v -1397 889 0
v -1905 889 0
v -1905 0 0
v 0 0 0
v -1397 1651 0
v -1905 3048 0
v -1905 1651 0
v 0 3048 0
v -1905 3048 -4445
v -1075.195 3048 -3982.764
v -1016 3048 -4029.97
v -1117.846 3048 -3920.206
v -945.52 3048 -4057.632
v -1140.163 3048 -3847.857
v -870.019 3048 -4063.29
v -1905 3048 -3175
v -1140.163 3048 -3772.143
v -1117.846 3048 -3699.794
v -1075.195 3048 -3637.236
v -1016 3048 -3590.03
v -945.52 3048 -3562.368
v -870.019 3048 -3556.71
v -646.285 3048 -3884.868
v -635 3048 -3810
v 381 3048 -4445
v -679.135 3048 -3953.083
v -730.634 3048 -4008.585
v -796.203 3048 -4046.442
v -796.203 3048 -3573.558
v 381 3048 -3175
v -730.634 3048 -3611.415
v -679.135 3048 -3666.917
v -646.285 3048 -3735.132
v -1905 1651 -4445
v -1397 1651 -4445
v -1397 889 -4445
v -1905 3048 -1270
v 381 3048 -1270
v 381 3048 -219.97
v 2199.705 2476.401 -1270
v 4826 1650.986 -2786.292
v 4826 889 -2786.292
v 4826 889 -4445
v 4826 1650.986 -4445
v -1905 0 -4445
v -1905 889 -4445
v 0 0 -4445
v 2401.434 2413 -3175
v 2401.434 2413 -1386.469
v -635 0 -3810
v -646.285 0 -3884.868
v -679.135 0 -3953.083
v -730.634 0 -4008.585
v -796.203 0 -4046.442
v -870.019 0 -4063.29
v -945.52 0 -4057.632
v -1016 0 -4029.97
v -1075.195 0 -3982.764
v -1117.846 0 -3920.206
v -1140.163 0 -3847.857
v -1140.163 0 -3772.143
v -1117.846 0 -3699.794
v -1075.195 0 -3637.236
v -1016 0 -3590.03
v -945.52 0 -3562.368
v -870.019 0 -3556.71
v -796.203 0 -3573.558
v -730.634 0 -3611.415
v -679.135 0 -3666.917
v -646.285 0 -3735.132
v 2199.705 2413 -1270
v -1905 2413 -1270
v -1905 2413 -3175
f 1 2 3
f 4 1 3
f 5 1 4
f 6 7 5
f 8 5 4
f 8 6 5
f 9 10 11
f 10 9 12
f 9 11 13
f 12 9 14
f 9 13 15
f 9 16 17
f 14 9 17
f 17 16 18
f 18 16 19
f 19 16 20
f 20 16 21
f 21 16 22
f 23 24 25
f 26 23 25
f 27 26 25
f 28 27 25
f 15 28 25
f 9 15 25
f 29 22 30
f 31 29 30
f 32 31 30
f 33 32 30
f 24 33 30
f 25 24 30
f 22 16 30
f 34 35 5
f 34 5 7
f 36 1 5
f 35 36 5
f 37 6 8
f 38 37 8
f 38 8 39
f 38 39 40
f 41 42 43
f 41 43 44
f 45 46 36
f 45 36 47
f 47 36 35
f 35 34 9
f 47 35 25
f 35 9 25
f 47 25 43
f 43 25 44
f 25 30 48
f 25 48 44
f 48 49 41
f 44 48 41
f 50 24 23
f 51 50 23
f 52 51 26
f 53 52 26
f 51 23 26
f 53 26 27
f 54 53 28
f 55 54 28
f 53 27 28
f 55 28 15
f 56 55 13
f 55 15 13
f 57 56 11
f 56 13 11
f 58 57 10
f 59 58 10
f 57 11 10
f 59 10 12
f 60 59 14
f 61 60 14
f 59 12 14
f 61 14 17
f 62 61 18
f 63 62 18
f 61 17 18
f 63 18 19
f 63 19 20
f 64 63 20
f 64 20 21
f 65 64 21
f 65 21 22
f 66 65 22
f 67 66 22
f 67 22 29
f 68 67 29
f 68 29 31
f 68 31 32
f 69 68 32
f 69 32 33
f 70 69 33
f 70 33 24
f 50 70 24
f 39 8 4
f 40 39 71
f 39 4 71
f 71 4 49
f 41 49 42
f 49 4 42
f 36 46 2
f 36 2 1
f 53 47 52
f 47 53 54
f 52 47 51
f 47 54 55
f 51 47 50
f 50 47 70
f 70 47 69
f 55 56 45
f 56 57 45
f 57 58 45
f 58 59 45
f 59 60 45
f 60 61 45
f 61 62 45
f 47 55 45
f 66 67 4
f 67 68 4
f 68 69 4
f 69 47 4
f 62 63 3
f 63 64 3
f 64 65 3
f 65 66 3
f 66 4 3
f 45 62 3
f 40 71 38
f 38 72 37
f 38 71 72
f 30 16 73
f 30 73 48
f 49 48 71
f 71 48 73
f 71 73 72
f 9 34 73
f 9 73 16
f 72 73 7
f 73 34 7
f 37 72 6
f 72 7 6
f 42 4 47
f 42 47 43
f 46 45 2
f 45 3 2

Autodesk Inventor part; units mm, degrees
ref_plane "YZ Plane" through (0, 0, 0) normal (1, 0, 0) x (0, 1, 0)
ref_plane "XZ Plane" through (0, 0, 0) normal (0, 1, 0) x (-1, 0, 0)
ref_plane "XY Plane" through (0, 0, 0) normal (0, 0, 1) x (1, 0, 0)
sketch "Sketch1" plane through (0, 0, 0) normal (0, 0, 1) x (1, 0, 0)
  line L0 (0, 0) -> (-1905, 0)
  line L1 (-1905, 0) -> (-1905, 889)
  line L2 (-1905, 889) -> (-1397, 889)
  line L3 (-1397, 889) -> (-1397, 1651)
  line L4 (-1397, 1651) -> (-1905, 1651)
  line L5 (-1905, 1651) -> (-1905, 3048)
  line L6 (-1905, 3048) -> (381, 3048)
  line L7 (4826, 2413) -> (381, 3048)
  line L8 (0, 0) -> (4445, 0)
  line L9 (4445, 0) -> (4826, 0)
  line L10 (4826, 0) -> (4826, 2413)
  dimension "d0" = 1905
  dimension "d1" = 889
  dimension "d2" = 508
  dimension "d3" = 762
  dimension "d4" = 508
  dimension "d5" = 1397
  dimension "d6" = 2286
  dimension "d10" = 4445
  dimension "d11" = 381
extrude "Extrusion1" add sketch "Sketch1" against normal blind 4445
sketch "Sketch3" plane through (-1905, 0, 0) normal (0, -1, 0) x (1, 0, 0)
  line L0 (1905, 0) -> (6731, -2786.2924)
  line L1 (6731, 0) -> (6731, -4445) projected
  line L2 (6731, -2786.2924) -> (6731, 0)
  line L3 (0, 0) -> (6731, 0) projected
  line L4 (1905, 0) -> (6731, 0)
extrude "Extrusion2" cut sketch "Sketch3" against normal through all
sketch "Sketch4" plane through (-1905, 0, -4445) normal (0, -1, 0) x (1, 0, 0)
  point P0 (1905, 4445)
  point P1 (6731, 0)
sketch "Sketch5" plane through (0, 0, 0) normal (0, 0, 1) x (1, 0, 0)
  line L0 (381, 3048) -> (4826, 1650.986)
  line L1 (4826, 1650.986) -> (4826, 3048)
  line L2 (-1905, 3048) -> (381, 3048) projected
  line L3 (4826, 3048) -> (381, 3048)
  point P0 (0, 0)
extrude "Extrusion3" cut sketch "Sketch5" against normal through all
sketch "Sketch6" plane through (0, 0, 0) normal (0, 0, 1) x (1, 0, 0)
  line L0 (-1397, 889) -> (-1397, 1651) projected
  line L1 (4826, 1650.986) -> (4826, 0) projected
  line L2 (4826, 0) -> (0, 0) projected
  line L3 (0, 0) -> (4826, 889)
  line L4 (0, 0) -> (4826, 0)
  line L5 (4826, 889) -> (4826, 0)
extrude "Extrusion4" cut sketch "Sketch6" against normal through all
sketch "Sketch7" plane through (-1905, 1651, 0) normal (-1, 0, 0) x (0, 0, 1)
  line L0 (-4445, 1397) -> (-4445, -0.014) projected
  line L1 (-3175, 1397) -> (-3175, 762)
  line L2 (-3175, 762) -> (-1270, 762)
  line L3 (-1270, 762) -> (-1270, 1397)
  line L4 (-1270, 1397) -> (-3175, 1397)
  point P0 (0, -1651)
  dimension "d24" = 635
  dimension "d25" = 1905
extrude "Extrusion5" cut sketch "Sketch7" against normal through all
sketch "Sketch8" plane through (-1905, 3048, -4445) normal (0, 1, 0) x (1, 0, 0)
  circle A0 centre (1016, -635) radius 254
  point P0 (1905, -4445)
  dimension "d30" = 508
extrude "Extrusion6" cut sketch "Sketch8" against normal through all
properties part number "Assignment 3.3 - Angle Slider"
